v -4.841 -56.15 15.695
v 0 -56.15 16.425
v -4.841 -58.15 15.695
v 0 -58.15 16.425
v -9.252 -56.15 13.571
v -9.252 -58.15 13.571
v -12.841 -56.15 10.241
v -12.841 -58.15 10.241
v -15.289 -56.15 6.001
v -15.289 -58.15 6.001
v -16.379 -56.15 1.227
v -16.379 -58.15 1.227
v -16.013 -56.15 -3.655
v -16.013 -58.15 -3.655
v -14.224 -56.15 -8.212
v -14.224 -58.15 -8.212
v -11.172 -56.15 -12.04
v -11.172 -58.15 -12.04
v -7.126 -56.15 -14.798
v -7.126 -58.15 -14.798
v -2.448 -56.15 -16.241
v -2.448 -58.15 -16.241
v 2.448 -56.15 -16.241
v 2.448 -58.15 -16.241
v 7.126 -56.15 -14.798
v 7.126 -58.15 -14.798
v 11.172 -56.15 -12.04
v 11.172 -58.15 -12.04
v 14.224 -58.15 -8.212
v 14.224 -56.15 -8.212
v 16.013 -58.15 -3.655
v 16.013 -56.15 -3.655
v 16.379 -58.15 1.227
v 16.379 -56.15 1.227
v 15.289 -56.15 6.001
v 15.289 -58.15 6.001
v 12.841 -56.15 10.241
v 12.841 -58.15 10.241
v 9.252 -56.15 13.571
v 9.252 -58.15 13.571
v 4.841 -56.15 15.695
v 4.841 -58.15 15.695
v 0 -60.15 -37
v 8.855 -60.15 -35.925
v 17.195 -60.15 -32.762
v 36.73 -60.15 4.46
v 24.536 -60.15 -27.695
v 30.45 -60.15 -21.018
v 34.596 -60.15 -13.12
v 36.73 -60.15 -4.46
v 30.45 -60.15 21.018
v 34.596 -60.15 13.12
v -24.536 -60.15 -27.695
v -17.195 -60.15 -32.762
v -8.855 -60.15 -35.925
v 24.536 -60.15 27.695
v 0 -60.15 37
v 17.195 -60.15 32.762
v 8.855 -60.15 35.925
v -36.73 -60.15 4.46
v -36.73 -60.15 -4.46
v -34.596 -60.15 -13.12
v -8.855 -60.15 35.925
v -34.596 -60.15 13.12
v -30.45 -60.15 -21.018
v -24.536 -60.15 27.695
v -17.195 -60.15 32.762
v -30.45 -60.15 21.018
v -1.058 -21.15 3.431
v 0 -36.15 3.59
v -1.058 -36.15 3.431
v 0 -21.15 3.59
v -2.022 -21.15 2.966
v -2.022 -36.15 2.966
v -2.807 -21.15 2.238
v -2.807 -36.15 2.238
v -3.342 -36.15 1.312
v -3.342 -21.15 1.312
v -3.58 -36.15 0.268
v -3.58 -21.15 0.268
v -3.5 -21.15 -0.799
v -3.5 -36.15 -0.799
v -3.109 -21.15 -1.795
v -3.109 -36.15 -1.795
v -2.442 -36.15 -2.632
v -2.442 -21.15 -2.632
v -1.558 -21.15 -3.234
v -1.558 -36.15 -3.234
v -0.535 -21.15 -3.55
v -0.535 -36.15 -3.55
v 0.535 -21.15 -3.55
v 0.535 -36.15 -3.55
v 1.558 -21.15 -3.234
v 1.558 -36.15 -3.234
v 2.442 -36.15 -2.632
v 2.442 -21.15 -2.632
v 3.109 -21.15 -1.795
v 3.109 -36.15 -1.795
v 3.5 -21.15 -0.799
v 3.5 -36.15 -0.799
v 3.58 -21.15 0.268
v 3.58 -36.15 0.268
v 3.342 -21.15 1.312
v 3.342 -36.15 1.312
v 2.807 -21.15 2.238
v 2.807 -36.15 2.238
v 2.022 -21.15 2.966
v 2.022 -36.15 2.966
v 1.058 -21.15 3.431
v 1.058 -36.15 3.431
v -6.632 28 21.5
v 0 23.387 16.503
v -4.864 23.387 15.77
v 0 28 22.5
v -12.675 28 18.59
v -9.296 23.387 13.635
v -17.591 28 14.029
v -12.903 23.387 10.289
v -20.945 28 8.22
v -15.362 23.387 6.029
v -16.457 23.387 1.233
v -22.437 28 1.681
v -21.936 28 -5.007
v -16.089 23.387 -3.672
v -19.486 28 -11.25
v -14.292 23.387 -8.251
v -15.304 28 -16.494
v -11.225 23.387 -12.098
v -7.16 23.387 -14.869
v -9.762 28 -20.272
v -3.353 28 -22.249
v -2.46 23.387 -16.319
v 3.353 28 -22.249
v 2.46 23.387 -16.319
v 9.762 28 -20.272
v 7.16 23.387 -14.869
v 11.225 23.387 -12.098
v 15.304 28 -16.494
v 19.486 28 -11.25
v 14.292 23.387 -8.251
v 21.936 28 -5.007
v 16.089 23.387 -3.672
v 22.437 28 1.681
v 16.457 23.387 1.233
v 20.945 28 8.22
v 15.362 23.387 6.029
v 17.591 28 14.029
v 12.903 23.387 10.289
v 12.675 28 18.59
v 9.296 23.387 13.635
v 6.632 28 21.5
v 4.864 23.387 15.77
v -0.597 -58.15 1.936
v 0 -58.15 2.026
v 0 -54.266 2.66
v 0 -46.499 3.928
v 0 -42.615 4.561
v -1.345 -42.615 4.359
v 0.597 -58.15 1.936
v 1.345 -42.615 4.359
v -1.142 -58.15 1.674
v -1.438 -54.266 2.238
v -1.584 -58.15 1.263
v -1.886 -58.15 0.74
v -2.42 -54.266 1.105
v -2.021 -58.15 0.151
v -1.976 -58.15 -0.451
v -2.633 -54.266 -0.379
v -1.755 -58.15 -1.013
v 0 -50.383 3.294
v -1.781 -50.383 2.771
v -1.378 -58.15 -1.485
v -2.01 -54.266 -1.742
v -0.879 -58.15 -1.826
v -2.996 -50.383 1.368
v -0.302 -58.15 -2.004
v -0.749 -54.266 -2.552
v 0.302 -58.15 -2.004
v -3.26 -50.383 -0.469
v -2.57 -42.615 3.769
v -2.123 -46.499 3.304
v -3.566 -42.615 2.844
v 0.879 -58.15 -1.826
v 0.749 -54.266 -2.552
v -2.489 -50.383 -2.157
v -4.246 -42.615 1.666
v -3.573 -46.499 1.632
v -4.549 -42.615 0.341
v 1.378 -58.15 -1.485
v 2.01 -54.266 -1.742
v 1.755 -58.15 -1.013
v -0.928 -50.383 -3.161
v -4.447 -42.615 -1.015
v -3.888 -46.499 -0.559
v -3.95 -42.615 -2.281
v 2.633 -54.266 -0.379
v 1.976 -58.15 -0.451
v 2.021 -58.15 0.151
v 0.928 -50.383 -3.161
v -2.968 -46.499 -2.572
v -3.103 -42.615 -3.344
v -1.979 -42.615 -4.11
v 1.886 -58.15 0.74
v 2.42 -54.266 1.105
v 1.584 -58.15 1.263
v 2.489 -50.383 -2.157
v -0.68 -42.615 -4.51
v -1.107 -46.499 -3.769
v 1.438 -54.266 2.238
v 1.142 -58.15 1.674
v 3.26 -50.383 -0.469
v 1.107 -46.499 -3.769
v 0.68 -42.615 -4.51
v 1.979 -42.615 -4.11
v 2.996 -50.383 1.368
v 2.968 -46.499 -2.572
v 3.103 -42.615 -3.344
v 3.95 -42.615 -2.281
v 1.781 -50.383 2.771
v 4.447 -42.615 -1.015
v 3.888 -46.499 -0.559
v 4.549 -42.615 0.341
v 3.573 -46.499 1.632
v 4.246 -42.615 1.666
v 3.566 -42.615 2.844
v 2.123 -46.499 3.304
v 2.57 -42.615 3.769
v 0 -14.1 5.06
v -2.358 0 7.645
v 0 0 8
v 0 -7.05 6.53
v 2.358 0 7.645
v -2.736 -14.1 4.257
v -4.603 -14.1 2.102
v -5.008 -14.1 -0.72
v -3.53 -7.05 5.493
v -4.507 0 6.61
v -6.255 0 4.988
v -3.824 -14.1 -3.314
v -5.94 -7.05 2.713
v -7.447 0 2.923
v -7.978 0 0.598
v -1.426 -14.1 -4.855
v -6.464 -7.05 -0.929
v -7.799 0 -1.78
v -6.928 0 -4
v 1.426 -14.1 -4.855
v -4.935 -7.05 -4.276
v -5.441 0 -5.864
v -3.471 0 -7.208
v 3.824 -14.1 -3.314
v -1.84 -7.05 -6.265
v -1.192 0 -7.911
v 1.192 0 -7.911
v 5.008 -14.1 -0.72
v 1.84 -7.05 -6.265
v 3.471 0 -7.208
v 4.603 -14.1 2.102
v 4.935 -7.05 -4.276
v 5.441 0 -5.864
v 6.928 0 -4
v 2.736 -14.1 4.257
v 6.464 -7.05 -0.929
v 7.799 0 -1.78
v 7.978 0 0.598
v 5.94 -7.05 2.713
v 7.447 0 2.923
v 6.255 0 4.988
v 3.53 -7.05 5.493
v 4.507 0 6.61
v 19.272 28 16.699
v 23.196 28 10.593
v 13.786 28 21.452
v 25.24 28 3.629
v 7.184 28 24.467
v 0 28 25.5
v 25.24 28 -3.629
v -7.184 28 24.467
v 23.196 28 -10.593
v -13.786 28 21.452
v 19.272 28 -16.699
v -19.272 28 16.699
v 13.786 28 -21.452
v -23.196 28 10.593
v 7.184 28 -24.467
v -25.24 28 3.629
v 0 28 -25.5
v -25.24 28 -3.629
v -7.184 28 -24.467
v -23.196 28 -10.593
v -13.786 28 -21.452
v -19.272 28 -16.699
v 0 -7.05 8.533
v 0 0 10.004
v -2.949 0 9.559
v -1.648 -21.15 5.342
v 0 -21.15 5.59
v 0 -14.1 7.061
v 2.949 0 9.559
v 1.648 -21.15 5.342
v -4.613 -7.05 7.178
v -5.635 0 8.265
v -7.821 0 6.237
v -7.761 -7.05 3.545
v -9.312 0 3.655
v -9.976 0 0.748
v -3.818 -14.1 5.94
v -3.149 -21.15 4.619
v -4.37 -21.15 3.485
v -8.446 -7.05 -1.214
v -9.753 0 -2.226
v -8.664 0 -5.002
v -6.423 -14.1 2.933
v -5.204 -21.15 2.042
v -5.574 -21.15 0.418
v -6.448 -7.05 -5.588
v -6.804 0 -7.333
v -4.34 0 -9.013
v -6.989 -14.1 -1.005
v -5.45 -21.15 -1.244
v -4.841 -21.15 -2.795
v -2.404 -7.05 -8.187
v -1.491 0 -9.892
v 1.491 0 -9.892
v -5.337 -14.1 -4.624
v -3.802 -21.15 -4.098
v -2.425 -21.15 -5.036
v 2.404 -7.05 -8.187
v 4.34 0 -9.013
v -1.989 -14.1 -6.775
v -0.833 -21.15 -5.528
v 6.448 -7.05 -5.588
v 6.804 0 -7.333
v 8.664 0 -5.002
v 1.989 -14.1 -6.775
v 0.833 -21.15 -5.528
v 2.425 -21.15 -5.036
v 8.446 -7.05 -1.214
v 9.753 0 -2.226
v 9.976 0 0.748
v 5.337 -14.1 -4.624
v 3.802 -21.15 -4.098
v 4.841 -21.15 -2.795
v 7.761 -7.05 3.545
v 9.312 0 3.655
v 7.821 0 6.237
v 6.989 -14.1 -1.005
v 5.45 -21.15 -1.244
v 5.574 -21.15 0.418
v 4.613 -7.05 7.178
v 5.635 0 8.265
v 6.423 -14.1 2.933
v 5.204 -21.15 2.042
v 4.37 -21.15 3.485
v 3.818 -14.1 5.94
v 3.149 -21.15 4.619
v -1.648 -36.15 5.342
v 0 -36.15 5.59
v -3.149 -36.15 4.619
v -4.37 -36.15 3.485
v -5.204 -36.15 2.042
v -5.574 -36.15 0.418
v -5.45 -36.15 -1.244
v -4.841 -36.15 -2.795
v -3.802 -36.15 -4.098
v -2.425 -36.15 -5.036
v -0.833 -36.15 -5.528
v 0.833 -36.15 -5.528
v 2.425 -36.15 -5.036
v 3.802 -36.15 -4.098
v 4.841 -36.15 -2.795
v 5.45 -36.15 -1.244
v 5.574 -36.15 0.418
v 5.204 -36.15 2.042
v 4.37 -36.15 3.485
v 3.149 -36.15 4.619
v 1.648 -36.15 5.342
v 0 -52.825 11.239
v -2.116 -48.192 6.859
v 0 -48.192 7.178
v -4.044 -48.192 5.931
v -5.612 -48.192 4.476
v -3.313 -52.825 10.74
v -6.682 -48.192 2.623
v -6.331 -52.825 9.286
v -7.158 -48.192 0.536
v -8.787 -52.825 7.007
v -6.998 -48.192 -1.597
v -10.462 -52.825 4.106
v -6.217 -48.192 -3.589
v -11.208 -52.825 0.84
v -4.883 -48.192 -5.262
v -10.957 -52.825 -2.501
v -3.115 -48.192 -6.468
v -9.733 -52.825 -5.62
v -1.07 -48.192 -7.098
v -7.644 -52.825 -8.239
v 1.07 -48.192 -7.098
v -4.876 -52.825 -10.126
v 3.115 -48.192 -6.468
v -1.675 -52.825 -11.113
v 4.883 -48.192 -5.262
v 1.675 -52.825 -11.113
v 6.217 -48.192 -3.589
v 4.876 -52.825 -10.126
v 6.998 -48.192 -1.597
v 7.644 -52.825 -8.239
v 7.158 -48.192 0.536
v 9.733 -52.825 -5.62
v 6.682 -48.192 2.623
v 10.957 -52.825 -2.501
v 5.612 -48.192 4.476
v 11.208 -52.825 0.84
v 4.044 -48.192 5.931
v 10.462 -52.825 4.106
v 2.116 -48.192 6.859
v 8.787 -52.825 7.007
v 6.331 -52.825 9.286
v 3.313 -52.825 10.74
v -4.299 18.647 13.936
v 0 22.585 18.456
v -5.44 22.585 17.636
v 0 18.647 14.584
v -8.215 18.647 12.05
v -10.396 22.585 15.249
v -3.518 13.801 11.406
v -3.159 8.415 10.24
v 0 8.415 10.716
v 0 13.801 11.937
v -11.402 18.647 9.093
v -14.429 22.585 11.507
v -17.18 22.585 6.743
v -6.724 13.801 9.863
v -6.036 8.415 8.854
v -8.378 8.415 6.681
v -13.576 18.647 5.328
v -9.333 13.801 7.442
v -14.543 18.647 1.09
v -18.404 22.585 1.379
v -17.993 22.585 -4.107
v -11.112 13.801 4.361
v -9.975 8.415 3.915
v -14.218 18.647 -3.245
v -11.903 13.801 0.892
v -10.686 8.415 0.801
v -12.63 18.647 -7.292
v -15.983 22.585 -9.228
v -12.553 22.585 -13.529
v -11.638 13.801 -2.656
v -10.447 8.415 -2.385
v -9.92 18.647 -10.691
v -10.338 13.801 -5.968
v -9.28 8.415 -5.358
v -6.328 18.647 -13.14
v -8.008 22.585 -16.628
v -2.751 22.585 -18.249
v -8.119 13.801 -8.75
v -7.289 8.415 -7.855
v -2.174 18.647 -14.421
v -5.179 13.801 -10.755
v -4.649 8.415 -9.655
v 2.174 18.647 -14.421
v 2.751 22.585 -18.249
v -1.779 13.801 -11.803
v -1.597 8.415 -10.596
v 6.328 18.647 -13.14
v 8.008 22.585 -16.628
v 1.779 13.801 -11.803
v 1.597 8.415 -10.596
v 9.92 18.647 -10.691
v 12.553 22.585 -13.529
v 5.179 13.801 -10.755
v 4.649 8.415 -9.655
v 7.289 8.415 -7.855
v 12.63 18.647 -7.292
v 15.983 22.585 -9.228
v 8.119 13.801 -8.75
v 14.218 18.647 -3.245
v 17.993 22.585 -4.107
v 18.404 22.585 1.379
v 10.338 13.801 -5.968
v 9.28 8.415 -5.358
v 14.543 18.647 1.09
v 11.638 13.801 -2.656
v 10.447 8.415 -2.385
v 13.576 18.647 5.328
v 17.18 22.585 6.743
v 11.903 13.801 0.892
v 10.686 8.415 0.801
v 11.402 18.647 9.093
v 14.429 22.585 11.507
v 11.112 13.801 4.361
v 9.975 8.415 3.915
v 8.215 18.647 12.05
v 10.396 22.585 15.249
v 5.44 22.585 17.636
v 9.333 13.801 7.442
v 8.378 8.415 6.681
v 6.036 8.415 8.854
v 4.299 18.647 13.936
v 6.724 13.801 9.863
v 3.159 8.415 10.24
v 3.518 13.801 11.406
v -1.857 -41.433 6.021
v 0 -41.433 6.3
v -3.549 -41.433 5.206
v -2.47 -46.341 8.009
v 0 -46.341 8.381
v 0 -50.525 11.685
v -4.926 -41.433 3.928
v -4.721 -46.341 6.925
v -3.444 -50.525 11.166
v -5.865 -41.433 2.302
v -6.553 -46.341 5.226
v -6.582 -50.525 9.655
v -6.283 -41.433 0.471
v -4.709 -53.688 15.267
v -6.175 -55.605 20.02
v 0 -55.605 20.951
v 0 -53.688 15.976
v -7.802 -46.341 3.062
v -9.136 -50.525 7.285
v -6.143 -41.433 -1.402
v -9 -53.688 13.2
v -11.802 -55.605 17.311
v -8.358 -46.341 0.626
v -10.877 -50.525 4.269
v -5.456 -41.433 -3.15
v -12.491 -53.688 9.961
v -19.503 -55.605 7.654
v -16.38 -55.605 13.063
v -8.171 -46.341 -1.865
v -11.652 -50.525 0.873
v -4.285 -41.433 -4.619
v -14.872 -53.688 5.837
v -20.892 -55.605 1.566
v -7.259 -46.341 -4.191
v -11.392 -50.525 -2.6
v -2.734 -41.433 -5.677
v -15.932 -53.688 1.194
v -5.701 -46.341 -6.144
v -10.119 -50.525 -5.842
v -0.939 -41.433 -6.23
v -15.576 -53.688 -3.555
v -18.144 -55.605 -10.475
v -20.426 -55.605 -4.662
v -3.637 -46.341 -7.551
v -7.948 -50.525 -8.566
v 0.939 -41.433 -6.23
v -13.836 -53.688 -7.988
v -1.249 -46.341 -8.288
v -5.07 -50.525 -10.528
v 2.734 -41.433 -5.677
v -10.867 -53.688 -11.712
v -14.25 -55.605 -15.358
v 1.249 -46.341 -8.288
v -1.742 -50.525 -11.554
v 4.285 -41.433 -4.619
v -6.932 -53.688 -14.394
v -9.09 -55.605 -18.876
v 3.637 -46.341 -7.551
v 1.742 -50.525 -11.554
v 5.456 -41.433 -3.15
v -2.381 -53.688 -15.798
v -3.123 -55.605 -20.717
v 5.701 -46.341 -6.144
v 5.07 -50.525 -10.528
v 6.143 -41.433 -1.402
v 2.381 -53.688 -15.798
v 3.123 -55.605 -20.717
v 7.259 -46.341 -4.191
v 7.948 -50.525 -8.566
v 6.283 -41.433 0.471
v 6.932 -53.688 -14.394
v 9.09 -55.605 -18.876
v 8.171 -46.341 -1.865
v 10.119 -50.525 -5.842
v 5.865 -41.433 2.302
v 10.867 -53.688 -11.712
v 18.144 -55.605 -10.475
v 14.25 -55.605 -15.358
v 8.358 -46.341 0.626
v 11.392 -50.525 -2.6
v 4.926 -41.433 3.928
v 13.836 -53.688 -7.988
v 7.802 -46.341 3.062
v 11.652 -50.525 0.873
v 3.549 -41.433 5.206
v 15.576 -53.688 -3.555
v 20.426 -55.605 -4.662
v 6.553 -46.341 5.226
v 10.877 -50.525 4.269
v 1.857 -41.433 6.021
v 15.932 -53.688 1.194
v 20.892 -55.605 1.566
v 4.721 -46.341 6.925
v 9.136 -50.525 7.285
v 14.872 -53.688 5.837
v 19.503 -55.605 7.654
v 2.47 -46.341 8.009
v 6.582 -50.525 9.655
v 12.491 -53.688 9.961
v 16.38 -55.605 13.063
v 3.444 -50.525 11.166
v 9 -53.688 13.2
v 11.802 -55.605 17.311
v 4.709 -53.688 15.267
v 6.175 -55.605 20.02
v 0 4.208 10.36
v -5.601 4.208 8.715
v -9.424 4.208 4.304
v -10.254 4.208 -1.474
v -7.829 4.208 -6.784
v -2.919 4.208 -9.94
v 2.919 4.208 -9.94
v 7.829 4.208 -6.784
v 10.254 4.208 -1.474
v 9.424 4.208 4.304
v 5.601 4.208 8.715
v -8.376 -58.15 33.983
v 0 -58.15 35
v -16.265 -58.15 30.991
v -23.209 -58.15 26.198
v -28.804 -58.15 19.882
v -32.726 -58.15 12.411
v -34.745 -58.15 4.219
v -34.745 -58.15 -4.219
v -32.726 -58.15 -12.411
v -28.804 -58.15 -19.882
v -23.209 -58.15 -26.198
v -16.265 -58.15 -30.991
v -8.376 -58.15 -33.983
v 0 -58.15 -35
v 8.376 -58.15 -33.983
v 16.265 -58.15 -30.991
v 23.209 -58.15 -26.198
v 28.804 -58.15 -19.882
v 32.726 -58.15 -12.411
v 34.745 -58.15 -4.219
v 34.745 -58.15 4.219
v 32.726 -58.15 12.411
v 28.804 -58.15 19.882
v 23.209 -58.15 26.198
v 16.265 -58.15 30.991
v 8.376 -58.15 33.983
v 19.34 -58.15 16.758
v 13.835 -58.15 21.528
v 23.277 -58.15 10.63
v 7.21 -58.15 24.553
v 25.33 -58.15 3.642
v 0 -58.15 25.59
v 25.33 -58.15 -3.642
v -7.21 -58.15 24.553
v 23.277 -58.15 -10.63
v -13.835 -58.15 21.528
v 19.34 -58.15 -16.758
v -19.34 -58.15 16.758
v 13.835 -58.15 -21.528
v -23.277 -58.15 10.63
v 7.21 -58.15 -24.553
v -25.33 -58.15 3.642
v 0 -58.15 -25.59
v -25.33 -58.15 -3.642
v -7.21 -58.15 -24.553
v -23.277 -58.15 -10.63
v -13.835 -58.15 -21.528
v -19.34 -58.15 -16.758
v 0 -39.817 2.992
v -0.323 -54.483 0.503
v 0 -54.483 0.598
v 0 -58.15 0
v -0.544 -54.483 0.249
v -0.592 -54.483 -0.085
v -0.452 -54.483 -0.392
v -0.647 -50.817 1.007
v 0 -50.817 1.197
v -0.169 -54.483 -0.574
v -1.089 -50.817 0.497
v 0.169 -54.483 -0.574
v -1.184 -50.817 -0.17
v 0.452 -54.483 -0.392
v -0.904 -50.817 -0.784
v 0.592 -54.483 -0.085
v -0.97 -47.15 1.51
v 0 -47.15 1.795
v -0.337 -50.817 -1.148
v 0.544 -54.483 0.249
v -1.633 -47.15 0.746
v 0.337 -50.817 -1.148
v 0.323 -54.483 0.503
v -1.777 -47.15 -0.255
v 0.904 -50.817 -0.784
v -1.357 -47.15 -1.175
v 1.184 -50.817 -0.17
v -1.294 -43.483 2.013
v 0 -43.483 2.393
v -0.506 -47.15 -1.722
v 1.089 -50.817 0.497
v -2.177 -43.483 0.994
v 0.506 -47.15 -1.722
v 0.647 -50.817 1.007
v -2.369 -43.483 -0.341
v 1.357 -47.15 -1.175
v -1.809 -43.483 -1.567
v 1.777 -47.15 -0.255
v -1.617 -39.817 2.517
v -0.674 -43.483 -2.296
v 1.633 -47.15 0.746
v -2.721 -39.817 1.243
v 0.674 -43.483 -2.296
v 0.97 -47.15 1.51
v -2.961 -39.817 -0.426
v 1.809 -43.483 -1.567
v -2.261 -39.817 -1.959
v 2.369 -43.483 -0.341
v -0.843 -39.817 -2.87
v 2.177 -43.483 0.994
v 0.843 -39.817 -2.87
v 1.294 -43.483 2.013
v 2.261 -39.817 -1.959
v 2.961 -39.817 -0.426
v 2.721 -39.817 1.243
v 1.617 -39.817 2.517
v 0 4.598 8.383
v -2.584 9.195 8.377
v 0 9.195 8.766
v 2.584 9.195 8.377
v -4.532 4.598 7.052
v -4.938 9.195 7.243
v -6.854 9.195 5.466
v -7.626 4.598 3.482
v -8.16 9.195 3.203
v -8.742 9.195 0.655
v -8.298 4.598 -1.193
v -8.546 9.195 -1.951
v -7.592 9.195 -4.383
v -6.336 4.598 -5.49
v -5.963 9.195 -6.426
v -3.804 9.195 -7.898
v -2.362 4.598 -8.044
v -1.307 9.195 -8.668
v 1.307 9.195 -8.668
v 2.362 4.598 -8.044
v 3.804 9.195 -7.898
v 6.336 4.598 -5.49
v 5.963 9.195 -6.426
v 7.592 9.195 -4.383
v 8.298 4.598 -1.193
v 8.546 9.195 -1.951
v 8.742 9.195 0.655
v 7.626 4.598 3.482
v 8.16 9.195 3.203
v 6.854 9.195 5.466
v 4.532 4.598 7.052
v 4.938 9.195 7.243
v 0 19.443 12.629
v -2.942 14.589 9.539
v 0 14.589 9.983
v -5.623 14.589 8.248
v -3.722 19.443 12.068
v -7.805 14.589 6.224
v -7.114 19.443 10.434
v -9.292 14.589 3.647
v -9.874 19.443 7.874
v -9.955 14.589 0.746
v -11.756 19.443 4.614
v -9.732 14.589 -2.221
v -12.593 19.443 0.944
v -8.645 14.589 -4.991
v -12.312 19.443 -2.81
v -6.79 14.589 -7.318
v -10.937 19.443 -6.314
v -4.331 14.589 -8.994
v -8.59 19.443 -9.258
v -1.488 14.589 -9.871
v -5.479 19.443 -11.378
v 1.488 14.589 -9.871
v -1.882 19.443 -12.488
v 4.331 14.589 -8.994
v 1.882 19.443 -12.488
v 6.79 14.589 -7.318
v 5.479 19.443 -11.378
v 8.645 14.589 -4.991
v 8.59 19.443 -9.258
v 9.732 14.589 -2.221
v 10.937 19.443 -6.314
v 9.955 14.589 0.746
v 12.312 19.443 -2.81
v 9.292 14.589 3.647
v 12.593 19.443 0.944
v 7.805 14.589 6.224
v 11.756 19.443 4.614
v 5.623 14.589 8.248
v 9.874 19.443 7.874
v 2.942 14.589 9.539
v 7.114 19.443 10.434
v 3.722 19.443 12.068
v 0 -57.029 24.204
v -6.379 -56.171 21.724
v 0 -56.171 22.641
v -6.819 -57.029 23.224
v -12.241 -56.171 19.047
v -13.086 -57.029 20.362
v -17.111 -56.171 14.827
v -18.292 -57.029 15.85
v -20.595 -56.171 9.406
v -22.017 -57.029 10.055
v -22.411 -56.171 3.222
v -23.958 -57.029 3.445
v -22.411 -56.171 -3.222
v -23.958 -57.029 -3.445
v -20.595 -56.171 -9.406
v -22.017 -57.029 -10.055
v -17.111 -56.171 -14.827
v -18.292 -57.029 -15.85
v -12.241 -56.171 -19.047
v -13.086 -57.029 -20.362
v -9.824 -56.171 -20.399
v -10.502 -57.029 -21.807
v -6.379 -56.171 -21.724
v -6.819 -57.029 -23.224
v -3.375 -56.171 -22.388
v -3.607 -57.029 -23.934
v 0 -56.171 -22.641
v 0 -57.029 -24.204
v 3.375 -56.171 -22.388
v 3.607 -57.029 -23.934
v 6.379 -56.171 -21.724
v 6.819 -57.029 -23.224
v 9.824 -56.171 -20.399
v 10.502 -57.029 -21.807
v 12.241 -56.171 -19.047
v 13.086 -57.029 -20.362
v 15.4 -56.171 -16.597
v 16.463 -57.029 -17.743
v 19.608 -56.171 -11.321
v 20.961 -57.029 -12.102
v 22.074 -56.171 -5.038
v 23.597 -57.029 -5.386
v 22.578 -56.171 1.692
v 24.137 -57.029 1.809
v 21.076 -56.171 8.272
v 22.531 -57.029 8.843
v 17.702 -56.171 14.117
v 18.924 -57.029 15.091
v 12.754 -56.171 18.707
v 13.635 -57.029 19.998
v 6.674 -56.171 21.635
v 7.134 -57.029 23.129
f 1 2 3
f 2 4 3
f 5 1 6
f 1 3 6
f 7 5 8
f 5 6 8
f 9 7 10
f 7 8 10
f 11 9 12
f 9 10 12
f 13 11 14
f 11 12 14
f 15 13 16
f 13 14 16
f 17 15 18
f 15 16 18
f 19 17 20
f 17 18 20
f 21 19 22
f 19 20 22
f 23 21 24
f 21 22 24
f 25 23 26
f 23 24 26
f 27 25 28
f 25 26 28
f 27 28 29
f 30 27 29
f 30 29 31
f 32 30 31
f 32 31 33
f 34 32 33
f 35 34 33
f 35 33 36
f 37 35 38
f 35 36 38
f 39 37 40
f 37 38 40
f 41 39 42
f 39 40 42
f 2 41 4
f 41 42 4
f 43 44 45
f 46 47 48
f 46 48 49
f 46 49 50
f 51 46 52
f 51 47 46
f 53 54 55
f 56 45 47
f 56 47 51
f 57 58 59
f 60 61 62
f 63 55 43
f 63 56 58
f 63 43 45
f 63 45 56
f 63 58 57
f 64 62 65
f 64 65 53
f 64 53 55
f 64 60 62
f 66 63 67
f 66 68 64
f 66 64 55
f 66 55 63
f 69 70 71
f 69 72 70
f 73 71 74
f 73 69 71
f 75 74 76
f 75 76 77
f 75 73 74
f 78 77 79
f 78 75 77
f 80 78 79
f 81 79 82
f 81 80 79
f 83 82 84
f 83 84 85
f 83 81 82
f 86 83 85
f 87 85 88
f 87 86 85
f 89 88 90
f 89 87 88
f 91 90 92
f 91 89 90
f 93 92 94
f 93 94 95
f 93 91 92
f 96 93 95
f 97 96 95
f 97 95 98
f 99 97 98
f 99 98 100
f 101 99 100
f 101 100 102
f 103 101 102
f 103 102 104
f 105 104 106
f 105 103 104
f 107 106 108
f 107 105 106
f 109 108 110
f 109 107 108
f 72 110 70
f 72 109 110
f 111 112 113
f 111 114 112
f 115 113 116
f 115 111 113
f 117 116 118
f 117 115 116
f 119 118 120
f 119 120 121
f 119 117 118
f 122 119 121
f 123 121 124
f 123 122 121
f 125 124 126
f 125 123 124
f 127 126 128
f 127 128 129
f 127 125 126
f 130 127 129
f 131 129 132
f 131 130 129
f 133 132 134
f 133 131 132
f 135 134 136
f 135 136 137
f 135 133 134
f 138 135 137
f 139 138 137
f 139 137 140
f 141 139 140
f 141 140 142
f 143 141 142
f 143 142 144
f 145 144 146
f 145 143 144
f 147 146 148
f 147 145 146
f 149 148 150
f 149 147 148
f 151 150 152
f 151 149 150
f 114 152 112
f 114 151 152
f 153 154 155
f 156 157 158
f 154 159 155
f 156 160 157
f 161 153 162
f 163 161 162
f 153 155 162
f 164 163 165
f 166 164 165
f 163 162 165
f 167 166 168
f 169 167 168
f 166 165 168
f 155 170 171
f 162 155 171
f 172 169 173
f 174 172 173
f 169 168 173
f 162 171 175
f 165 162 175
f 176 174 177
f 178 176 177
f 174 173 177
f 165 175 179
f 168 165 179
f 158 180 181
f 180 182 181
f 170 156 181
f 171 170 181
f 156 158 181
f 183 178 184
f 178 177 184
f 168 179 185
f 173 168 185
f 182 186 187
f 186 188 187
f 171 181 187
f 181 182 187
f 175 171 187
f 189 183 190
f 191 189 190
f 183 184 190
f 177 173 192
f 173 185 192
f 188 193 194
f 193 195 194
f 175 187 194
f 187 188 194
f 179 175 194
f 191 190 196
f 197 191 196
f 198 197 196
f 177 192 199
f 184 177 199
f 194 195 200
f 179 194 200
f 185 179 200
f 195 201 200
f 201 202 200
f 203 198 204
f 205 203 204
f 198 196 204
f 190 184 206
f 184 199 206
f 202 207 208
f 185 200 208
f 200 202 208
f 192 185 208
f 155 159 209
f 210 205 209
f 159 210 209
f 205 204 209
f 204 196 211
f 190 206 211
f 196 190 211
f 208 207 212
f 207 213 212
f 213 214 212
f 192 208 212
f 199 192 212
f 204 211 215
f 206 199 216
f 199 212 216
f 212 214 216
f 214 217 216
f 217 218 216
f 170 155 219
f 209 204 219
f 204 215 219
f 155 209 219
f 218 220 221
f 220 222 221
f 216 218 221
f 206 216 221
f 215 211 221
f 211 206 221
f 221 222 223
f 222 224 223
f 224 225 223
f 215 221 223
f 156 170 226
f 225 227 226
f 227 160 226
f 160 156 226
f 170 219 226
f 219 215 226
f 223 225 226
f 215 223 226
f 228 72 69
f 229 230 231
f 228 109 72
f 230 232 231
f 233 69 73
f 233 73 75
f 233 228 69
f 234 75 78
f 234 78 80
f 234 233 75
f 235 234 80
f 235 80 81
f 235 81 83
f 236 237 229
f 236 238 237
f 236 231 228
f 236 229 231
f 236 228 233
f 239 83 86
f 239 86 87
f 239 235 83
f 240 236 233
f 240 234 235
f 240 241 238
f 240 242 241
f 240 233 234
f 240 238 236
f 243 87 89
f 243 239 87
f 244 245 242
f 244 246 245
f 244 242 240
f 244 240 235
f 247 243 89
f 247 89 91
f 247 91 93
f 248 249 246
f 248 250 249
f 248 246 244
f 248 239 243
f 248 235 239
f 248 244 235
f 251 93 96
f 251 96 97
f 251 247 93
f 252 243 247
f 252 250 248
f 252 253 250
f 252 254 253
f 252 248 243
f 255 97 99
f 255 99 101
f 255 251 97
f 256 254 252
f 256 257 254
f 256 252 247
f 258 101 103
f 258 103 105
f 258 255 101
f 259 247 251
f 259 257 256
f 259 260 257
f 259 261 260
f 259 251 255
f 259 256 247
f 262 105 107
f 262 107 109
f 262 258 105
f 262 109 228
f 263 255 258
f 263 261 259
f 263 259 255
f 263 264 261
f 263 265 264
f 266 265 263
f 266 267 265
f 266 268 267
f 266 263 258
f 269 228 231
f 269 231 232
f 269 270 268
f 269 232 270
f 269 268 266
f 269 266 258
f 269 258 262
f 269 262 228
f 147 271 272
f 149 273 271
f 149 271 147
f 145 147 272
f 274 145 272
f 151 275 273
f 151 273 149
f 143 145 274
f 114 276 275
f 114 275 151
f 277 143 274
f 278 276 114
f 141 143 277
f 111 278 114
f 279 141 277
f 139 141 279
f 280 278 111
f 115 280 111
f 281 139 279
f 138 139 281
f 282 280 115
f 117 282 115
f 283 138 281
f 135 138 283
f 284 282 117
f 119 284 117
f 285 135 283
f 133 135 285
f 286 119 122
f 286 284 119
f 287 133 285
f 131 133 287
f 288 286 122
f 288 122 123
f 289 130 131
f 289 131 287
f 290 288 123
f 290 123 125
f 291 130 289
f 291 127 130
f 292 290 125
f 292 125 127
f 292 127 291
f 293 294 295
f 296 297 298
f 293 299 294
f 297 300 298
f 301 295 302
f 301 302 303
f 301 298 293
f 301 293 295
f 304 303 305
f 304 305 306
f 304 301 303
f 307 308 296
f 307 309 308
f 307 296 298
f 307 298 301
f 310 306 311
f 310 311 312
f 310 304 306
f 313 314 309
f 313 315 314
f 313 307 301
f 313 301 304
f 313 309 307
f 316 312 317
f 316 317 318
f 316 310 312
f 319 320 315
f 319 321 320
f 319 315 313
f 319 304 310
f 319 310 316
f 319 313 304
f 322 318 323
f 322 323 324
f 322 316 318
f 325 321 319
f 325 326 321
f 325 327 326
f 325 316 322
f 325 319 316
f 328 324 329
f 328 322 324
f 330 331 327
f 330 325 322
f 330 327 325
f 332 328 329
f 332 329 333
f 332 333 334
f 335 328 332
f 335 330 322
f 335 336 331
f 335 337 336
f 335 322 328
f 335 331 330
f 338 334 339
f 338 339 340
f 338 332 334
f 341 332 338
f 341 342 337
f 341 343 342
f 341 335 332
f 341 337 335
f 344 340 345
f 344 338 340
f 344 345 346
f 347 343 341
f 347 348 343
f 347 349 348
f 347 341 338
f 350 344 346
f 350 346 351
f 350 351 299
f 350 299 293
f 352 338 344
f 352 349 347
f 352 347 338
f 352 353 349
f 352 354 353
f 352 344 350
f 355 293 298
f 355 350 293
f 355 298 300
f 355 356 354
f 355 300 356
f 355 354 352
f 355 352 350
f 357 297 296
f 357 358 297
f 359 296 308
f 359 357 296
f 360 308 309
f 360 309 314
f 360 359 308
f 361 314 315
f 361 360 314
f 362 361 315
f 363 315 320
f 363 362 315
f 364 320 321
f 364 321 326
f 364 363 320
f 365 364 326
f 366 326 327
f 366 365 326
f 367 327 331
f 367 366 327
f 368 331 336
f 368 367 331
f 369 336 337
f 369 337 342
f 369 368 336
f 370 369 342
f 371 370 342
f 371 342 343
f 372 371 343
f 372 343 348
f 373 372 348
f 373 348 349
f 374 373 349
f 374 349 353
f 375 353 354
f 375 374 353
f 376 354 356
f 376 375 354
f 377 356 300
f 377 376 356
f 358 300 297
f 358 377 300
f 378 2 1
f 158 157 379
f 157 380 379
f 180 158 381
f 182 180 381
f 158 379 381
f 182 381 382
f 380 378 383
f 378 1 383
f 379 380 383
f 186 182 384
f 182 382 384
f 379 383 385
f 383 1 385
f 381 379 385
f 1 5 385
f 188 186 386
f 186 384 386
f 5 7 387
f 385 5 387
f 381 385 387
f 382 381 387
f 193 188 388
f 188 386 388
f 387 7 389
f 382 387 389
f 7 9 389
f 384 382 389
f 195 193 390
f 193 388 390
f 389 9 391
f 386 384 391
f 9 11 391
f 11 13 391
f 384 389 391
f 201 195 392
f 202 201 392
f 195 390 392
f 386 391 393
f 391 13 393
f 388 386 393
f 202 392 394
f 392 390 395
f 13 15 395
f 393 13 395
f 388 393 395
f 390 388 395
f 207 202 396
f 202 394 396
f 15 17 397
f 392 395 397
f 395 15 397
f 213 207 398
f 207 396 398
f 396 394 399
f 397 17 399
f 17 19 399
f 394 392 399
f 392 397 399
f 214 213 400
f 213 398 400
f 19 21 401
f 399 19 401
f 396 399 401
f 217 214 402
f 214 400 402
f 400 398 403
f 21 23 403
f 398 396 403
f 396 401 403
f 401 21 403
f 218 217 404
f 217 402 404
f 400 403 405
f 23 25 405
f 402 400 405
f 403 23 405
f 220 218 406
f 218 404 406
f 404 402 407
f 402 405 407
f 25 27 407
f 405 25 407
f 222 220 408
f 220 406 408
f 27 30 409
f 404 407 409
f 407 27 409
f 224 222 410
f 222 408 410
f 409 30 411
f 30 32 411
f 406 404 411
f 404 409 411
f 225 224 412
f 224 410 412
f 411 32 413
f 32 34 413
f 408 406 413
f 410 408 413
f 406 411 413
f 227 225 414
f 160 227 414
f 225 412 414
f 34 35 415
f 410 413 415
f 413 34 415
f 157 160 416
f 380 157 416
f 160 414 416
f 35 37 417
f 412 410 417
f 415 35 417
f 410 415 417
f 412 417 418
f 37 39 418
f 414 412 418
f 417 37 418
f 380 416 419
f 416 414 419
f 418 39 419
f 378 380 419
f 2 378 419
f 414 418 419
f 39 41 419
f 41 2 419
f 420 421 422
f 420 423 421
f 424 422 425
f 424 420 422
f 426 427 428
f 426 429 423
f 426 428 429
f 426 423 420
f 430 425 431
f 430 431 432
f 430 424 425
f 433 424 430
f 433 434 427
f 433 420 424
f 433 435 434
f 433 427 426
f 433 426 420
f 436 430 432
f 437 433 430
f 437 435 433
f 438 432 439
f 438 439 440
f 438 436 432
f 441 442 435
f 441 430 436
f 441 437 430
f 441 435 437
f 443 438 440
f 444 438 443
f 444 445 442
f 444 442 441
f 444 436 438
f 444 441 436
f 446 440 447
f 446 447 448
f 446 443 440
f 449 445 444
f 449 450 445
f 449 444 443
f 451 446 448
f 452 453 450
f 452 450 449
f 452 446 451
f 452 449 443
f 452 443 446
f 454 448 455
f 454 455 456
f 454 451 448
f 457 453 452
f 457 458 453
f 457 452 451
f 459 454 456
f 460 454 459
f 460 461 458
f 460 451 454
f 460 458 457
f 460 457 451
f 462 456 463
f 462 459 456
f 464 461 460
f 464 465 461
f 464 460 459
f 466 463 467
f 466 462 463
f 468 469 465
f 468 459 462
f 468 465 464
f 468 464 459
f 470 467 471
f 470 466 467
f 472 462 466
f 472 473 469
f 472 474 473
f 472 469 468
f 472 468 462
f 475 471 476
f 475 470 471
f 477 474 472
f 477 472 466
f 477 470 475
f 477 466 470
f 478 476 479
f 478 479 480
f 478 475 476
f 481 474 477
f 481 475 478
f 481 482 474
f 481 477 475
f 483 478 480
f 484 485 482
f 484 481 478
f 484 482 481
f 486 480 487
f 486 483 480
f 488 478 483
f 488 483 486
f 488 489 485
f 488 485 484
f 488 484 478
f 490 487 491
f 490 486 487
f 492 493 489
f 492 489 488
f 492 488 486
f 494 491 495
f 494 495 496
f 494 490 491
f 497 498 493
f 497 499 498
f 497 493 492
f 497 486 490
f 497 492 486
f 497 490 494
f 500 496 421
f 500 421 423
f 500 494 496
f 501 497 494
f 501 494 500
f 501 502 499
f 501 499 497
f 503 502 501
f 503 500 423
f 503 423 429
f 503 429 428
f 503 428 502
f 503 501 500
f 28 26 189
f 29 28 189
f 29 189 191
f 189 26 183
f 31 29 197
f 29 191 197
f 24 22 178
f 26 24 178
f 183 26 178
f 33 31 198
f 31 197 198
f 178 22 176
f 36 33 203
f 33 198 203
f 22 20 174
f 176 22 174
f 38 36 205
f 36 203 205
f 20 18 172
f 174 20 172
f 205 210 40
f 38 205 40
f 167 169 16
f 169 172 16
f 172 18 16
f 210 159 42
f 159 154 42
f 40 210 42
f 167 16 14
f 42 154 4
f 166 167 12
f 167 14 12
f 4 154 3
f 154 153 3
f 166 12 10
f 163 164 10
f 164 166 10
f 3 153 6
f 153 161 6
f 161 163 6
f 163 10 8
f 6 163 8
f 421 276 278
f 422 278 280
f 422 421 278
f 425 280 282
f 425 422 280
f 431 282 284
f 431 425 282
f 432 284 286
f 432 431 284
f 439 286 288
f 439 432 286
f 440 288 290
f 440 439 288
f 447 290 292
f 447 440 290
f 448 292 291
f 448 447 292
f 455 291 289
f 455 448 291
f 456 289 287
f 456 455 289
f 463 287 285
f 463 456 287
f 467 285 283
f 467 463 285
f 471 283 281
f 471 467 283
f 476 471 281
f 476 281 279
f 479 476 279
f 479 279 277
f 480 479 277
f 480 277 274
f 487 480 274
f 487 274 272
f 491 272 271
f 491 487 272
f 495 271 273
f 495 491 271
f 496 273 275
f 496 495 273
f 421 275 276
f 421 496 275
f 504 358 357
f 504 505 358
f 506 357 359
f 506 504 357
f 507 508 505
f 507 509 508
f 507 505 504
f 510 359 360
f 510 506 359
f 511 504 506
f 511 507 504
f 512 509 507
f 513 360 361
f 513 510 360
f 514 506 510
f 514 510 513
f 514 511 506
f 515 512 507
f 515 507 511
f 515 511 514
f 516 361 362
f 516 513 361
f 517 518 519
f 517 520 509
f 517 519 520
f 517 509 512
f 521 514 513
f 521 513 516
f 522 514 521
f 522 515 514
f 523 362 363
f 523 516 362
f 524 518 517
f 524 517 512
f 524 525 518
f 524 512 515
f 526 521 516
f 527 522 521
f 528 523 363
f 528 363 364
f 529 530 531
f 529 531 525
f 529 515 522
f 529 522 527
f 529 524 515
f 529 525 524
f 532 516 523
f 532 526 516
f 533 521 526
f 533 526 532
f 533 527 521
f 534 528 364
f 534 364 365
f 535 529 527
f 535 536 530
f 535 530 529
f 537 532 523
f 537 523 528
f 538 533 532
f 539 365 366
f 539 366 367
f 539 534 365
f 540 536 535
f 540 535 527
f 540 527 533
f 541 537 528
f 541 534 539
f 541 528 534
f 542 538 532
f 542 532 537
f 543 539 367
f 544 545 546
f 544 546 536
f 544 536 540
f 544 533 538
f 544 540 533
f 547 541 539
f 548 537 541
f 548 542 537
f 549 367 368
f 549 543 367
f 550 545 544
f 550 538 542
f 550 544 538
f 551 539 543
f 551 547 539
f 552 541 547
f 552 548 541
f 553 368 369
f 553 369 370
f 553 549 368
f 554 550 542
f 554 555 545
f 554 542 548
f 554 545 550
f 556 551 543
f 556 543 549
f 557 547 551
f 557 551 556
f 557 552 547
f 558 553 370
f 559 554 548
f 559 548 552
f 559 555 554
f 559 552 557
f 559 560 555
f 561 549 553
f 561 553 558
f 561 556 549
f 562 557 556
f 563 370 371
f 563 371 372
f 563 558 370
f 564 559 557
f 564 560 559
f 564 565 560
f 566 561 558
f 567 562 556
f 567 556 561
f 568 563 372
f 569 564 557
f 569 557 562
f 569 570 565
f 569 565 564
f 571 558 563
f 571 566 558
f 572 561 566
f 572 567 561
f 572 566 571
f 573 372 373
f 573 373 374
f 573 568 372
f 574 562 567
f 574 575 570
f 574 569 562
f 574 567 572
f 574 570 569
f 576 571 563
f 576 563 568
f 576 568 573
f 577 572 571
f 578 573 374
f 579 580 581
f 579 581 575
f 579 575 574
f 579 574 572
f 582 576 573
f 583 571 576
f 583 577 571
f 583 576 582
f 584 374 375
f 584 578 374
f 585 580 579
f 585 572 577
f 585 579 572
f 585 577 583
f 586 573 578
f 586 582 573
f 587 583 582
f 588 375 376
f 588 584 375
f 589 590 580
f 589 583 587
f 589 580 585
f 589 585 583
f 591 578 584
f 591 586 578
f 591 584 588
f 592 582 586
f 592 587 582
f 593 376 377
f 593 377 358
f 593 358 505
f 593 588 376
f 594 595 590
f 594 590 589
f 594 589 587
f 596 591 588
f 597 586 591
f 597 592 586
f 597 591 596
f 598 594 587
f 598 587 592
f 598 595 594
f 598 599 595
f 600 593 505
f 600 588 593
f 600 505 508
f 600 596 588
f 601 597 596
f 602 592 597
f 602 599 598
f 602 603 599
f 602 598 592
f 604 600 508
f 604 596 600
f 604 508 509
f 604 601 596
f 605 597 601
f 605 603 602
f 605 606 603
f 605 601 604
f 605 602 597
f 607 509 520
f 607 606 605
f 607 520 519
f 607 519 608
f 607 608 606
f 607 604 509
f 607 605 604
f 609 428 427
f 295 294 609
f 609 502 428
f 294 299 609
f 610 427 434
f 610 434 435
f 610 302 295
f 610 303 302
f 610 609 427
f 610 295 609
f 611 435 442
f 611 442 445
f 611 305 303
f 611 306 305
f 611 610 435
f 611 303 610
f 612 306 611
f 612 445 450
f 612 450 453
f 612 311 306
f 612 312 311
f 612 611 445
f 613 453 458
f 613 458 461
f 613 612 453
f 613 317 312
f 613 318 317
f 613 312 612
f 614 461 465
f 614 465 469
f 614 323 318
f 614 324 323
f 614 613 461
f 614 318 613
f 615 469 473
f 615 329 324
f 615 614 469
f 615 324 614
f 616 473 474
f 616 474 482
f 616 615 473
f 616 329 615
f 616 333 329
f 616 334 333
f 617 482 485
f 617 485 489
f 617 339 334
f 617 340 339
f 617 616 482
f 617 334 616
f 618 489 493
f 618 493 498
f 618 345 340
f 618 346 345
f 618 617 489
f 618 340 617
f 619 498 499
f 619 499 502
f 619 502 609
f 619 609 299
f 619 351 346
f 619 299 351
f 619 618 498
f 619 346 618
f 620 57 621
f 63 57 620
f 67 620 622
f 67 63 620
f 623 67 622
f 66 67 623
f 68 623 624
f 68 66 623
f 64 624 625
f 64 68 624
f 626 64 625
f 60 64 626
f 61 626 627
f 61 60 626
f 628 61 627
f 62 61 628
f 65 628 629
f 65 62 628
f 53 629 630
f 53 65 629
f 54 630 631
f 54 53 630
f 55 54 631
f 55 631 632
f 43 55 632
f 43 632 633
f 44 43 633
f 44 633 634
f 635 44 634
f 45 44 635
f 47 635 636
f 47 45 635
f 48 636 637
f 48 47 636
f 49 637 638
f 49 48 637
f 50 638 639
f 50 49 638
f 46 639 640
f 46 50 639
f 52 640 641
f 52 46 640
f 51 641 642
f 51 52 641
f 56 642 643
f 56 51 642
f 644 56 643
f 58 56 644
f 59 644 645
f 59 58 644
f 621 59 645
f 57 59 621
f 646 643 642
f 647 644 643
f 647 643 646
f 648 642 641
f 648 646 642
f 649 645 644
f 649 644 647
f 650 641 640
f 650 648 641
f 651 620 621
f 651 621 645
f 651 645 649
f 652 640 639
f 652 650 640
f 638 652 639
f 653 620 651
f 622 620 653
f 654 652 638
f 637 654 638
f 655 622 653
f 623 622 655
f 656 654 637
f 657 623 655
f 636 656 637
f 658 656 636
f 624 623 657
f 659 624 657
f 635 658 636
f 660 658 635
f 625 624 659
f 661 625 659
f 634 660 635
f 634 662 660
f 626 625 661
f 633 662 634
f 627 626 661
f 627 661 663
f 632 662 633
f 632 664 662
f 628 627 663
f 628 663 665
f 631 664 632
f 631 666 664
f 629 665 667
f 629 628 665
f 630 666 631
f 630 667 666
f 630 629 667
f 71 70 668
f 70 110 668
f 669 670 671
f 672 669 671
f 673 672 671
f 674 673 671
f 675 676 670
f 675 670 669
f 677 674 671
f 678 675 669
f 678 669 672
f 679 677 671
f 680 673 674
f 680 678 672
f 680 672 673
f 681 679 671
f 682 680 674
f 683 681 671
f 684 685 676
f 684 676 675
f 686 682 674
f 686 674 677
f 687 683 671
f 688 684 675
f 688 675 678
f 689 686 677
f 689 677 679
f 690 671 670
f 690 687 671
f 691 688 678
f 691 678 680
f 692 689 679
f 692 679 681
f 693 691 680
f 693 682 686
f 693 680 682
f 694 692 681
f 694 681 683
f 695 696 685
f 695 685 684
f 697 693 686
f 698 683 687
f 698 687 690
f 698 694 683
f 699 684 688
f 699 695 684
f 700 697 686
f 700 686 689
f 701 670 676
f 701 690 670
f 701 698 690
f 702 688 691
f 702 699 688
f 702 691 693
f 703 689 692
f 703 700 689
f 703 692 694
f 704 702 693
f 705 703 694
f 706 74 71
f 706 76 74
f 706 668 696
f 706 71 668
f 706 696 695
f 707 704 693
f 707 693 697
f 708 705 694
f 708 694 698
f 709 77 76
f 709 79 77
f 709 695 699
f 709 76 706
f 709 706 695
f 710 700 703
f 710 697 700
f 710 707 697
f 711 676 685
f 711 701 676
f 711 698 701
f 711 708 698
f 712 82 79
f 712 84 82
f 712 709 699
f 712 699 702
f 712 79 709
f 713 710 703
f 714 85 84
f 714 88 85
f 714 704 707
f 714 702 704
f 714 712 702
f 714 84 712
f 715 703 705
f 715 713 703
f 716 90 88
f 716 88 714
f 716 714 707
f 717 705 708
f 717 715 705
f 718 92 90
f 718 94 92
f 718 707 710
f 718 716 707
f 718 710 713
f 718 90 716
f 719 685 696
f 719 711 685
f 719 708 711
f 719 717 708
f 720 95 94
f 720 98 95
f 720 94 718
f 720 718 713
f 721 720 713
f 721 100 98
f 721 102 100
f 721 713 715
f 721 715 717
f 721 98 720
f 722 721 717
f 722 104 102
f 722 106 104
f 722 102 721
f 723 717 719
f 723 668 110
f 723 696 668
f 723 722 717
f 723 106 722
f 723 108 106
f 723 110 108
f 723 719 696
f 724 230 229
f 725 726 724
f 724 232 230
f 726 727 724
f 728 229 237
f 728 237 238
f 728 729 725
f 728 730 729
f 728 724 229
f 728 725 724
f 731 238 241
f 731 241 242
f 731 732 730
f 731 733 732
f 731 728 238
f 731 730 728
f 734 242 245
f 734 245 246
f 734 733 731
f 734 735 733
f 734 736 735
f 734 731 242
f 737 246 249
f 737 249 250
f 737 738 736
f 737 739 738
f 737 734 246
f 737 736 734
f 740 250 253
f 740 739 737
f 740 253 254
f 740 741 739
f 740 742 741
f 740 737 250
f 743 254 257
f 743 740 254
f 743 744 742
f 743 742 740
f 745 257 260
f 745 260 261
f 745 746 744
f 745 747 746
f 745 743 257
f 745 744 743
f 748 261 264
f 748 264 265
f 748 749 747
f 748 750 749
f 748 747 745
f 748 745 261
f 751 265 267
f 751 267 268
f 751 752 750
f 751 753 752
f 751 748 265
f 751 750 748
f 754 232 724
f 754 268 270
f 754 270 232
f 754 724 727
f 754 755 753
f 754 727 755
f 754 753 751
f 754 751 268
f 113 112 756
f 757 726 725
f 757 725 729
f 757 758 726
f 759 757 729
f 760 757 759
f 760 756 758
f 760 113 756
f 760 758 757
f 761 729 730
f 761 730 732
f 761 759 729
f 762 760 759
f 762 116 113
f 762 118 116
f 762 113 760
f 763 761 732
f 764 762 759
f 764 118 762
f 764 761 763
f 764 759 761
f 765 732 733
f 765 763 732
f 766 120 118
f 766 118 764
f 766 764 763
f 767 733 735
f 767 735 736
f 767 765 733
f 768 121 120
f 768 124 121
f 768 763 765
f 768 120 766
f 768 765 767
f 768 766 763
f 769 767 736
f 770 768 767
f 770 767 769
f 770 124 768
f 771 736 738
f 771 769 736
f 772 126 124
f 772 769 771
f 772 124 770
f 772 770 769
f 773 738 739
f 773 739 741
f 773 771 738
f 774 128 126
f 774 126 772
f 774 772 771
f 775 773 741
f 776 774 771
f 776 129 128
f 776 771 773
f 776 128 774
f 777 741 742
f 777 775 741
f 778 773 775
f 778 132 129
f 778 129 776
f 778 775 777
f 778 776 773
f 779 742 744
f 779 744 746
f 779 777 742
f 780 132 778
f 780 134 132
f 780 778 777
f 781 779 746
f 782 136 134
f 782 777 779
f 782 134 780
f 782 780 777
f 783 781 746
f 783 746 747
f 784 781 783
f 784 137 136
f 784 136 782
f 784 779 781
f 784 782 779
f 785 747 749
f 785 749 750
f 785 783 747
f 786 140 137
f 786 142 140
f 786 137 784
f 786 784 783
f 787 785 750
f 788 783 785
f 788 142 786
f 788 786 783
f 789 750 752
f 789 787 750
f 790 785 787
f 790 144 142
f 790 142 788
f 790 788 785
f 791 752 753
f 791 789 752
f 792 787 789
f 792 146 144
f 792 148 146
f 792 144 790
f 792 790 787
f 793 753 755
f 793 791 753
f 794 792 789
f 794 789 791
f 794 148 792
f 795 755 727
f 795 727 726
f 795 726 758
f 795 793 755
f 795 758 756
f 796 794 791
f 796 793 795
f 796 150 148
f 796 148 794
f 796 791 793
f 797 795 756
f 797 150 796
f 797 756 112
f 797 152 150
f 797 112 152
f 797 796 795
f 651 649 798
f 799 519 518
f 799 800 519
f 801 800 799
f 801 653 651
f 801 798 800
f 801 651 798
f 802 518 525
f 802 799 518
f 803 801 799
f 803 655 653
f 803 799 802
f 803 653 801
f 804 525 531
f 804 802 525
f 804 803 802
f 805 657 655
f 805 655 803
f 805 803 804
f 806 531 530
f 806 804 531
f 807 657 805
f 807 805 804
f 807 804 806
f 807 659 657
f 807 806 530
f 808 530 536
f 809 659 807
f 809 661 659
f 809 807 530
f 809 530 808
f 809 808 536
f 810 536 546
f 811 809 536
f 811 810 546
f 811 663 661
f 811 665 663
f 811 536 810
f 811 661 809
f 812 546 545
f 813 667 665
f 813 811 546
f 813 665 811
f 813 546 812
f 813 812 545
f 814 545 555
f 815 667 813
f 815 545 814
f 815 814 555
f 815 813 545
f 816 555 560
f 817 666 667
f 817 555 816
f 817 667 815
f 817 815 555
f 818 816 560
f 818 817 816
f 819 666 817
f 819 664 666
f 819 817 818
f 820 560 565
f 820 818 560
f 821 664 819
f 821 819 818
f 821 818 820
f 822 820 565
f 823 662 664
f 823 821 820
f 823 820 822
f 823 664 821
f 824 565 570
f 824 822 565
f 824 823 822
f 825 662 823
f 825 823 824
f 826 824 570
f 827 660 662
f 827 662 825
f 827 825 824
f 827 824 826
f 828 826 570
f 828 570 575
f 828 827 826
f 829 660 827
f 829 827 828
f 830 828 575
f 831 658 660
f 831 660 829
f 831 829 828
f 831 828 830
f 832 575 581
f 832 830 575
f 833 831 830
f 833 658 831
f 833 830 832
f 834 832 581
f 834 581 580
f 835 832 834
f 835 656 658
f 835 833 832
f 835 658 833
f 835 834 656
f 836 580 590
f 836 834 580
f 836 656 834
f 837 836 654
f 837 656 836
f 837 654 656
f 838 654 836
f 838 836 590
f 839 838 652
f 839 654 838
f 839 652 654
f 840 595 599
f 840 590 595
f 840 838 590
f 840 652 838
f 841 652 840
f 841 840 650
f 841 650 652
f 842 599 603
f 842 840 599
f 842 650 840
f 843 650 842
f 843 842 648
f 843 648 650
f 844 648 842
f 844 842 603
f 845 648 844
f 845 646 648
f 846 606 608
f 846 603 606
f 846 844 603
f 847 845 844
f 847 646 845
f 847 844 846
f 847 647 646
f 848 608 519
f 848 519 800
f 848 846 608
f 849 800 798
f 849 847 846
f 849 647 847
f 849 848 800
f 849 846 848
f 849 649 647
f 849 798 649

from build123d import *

# Parameters (mm, degrees)
FILLET1_R = 10


with BuildPart() as part:
    # Sketch1 → Revolve2 (revolve)
    with BuildSketch(Plane.XY, mode=Mode.PRIVATE) as revolve2_sk:
        with BuildLine():
            Line((-3.59, -36.15), (-3.59, -21.15))
            Line((-3.59, -21.15), (-8, 0))
            Line((-8, 0), (-8.766277994, 9.195335924))
            ThreePointArc((-8.766277994, 9.195335924), (-11.137120078, 17.107504902), (-16.502977942, 23.386906109))
            Line((-16.502977942, 23.386906109), (-22.5, 28))
            Line((-22.5, 28), (-25.5, 28))
            Line((-25.5, 28), (-18.455600302, 22.584866513))
            ThreePointArc((-18.455600302, 22.584866513), (-13.092321233, 16.315659868), (-10.71591345, 8.415001644))
            Line((-10.71591345, 8.415001644), (-10.003752773, 0))
            Line((-10.003752773, 0), (-5.59, -21.15))
            Line((-5.59, -21.15), (-5.59, -36.15))
            ThreePointArc((-5.59, -36.15), (-11.447864376, -50.292135624), (-25.59, -56.15))
            Line((-25.59, -56.15), (-25.59, -58.15))
            Line((-25.59, -58.15), (-35, -58.15))
            Line((-35, -58.15), (-37, -60.15))
            Line((-37, -60.15), (0, -60.15))
            Line((0, -60.15), (0, -58.15))
            Line((0, -58.15), (-3.59, -36.15))
        make_face()
        with BuildLine():
            Line((-16.42484861, -56.15), (-16.42484861, -58.15))
            Line((-16.42484861, -58.15), (-2.026453361, -58.15))
            Line((-2.026453361, -58.15), (-4.561439674, -42.615264931))
            ThreePointArc((-4.561439674, -42.615264931), (-9.045746613, -50.651299247), (-16.42484861, -56.15))
        make_face(mode=Mode.SUBTRACT)
    revolve(revolve2_sk.sketch.rotate(Axis((0, 74.39046888, 0), (0, -1, 0)), 270), axis=Axis((0, 74.39046888, 0), (0, -1, 0)))

    # Fillet1
    # the kernel refuses this fillet: 10 mm, written as the material it takes off along each edge
    with BuildSketch(Plane(origin=(0, -56.15, 0), x_dir=(0, 0, 1), z_dir=(1, 0, 0))) as fillet1_piece_1:
        with BuildLine():
            CenterArc((18.631445006, 9.181818182), FILLET1_R, 283.412011605, 30.683417109)
            Line((25.59, 2), (25.7291711, 1.856363636))
            ThreePointArc((25.7291711, 1.856363636), (25.79, 1), (25.79, 0))
            Line((25.79, 0), (25.59, -0.2))
            ThreePointArc((25.59, -0.2), (23.277858136, -0.335463392), (20.997353704, -0.74))
            Line((20.997353704, -0.74), (20.950963337, -0.545454545))
        make_face()
    revolve(axis=Axis((0, -56.15, 0), (0, -1, 0)), mode=Mode.SUBTRACT)


solid = part.part
